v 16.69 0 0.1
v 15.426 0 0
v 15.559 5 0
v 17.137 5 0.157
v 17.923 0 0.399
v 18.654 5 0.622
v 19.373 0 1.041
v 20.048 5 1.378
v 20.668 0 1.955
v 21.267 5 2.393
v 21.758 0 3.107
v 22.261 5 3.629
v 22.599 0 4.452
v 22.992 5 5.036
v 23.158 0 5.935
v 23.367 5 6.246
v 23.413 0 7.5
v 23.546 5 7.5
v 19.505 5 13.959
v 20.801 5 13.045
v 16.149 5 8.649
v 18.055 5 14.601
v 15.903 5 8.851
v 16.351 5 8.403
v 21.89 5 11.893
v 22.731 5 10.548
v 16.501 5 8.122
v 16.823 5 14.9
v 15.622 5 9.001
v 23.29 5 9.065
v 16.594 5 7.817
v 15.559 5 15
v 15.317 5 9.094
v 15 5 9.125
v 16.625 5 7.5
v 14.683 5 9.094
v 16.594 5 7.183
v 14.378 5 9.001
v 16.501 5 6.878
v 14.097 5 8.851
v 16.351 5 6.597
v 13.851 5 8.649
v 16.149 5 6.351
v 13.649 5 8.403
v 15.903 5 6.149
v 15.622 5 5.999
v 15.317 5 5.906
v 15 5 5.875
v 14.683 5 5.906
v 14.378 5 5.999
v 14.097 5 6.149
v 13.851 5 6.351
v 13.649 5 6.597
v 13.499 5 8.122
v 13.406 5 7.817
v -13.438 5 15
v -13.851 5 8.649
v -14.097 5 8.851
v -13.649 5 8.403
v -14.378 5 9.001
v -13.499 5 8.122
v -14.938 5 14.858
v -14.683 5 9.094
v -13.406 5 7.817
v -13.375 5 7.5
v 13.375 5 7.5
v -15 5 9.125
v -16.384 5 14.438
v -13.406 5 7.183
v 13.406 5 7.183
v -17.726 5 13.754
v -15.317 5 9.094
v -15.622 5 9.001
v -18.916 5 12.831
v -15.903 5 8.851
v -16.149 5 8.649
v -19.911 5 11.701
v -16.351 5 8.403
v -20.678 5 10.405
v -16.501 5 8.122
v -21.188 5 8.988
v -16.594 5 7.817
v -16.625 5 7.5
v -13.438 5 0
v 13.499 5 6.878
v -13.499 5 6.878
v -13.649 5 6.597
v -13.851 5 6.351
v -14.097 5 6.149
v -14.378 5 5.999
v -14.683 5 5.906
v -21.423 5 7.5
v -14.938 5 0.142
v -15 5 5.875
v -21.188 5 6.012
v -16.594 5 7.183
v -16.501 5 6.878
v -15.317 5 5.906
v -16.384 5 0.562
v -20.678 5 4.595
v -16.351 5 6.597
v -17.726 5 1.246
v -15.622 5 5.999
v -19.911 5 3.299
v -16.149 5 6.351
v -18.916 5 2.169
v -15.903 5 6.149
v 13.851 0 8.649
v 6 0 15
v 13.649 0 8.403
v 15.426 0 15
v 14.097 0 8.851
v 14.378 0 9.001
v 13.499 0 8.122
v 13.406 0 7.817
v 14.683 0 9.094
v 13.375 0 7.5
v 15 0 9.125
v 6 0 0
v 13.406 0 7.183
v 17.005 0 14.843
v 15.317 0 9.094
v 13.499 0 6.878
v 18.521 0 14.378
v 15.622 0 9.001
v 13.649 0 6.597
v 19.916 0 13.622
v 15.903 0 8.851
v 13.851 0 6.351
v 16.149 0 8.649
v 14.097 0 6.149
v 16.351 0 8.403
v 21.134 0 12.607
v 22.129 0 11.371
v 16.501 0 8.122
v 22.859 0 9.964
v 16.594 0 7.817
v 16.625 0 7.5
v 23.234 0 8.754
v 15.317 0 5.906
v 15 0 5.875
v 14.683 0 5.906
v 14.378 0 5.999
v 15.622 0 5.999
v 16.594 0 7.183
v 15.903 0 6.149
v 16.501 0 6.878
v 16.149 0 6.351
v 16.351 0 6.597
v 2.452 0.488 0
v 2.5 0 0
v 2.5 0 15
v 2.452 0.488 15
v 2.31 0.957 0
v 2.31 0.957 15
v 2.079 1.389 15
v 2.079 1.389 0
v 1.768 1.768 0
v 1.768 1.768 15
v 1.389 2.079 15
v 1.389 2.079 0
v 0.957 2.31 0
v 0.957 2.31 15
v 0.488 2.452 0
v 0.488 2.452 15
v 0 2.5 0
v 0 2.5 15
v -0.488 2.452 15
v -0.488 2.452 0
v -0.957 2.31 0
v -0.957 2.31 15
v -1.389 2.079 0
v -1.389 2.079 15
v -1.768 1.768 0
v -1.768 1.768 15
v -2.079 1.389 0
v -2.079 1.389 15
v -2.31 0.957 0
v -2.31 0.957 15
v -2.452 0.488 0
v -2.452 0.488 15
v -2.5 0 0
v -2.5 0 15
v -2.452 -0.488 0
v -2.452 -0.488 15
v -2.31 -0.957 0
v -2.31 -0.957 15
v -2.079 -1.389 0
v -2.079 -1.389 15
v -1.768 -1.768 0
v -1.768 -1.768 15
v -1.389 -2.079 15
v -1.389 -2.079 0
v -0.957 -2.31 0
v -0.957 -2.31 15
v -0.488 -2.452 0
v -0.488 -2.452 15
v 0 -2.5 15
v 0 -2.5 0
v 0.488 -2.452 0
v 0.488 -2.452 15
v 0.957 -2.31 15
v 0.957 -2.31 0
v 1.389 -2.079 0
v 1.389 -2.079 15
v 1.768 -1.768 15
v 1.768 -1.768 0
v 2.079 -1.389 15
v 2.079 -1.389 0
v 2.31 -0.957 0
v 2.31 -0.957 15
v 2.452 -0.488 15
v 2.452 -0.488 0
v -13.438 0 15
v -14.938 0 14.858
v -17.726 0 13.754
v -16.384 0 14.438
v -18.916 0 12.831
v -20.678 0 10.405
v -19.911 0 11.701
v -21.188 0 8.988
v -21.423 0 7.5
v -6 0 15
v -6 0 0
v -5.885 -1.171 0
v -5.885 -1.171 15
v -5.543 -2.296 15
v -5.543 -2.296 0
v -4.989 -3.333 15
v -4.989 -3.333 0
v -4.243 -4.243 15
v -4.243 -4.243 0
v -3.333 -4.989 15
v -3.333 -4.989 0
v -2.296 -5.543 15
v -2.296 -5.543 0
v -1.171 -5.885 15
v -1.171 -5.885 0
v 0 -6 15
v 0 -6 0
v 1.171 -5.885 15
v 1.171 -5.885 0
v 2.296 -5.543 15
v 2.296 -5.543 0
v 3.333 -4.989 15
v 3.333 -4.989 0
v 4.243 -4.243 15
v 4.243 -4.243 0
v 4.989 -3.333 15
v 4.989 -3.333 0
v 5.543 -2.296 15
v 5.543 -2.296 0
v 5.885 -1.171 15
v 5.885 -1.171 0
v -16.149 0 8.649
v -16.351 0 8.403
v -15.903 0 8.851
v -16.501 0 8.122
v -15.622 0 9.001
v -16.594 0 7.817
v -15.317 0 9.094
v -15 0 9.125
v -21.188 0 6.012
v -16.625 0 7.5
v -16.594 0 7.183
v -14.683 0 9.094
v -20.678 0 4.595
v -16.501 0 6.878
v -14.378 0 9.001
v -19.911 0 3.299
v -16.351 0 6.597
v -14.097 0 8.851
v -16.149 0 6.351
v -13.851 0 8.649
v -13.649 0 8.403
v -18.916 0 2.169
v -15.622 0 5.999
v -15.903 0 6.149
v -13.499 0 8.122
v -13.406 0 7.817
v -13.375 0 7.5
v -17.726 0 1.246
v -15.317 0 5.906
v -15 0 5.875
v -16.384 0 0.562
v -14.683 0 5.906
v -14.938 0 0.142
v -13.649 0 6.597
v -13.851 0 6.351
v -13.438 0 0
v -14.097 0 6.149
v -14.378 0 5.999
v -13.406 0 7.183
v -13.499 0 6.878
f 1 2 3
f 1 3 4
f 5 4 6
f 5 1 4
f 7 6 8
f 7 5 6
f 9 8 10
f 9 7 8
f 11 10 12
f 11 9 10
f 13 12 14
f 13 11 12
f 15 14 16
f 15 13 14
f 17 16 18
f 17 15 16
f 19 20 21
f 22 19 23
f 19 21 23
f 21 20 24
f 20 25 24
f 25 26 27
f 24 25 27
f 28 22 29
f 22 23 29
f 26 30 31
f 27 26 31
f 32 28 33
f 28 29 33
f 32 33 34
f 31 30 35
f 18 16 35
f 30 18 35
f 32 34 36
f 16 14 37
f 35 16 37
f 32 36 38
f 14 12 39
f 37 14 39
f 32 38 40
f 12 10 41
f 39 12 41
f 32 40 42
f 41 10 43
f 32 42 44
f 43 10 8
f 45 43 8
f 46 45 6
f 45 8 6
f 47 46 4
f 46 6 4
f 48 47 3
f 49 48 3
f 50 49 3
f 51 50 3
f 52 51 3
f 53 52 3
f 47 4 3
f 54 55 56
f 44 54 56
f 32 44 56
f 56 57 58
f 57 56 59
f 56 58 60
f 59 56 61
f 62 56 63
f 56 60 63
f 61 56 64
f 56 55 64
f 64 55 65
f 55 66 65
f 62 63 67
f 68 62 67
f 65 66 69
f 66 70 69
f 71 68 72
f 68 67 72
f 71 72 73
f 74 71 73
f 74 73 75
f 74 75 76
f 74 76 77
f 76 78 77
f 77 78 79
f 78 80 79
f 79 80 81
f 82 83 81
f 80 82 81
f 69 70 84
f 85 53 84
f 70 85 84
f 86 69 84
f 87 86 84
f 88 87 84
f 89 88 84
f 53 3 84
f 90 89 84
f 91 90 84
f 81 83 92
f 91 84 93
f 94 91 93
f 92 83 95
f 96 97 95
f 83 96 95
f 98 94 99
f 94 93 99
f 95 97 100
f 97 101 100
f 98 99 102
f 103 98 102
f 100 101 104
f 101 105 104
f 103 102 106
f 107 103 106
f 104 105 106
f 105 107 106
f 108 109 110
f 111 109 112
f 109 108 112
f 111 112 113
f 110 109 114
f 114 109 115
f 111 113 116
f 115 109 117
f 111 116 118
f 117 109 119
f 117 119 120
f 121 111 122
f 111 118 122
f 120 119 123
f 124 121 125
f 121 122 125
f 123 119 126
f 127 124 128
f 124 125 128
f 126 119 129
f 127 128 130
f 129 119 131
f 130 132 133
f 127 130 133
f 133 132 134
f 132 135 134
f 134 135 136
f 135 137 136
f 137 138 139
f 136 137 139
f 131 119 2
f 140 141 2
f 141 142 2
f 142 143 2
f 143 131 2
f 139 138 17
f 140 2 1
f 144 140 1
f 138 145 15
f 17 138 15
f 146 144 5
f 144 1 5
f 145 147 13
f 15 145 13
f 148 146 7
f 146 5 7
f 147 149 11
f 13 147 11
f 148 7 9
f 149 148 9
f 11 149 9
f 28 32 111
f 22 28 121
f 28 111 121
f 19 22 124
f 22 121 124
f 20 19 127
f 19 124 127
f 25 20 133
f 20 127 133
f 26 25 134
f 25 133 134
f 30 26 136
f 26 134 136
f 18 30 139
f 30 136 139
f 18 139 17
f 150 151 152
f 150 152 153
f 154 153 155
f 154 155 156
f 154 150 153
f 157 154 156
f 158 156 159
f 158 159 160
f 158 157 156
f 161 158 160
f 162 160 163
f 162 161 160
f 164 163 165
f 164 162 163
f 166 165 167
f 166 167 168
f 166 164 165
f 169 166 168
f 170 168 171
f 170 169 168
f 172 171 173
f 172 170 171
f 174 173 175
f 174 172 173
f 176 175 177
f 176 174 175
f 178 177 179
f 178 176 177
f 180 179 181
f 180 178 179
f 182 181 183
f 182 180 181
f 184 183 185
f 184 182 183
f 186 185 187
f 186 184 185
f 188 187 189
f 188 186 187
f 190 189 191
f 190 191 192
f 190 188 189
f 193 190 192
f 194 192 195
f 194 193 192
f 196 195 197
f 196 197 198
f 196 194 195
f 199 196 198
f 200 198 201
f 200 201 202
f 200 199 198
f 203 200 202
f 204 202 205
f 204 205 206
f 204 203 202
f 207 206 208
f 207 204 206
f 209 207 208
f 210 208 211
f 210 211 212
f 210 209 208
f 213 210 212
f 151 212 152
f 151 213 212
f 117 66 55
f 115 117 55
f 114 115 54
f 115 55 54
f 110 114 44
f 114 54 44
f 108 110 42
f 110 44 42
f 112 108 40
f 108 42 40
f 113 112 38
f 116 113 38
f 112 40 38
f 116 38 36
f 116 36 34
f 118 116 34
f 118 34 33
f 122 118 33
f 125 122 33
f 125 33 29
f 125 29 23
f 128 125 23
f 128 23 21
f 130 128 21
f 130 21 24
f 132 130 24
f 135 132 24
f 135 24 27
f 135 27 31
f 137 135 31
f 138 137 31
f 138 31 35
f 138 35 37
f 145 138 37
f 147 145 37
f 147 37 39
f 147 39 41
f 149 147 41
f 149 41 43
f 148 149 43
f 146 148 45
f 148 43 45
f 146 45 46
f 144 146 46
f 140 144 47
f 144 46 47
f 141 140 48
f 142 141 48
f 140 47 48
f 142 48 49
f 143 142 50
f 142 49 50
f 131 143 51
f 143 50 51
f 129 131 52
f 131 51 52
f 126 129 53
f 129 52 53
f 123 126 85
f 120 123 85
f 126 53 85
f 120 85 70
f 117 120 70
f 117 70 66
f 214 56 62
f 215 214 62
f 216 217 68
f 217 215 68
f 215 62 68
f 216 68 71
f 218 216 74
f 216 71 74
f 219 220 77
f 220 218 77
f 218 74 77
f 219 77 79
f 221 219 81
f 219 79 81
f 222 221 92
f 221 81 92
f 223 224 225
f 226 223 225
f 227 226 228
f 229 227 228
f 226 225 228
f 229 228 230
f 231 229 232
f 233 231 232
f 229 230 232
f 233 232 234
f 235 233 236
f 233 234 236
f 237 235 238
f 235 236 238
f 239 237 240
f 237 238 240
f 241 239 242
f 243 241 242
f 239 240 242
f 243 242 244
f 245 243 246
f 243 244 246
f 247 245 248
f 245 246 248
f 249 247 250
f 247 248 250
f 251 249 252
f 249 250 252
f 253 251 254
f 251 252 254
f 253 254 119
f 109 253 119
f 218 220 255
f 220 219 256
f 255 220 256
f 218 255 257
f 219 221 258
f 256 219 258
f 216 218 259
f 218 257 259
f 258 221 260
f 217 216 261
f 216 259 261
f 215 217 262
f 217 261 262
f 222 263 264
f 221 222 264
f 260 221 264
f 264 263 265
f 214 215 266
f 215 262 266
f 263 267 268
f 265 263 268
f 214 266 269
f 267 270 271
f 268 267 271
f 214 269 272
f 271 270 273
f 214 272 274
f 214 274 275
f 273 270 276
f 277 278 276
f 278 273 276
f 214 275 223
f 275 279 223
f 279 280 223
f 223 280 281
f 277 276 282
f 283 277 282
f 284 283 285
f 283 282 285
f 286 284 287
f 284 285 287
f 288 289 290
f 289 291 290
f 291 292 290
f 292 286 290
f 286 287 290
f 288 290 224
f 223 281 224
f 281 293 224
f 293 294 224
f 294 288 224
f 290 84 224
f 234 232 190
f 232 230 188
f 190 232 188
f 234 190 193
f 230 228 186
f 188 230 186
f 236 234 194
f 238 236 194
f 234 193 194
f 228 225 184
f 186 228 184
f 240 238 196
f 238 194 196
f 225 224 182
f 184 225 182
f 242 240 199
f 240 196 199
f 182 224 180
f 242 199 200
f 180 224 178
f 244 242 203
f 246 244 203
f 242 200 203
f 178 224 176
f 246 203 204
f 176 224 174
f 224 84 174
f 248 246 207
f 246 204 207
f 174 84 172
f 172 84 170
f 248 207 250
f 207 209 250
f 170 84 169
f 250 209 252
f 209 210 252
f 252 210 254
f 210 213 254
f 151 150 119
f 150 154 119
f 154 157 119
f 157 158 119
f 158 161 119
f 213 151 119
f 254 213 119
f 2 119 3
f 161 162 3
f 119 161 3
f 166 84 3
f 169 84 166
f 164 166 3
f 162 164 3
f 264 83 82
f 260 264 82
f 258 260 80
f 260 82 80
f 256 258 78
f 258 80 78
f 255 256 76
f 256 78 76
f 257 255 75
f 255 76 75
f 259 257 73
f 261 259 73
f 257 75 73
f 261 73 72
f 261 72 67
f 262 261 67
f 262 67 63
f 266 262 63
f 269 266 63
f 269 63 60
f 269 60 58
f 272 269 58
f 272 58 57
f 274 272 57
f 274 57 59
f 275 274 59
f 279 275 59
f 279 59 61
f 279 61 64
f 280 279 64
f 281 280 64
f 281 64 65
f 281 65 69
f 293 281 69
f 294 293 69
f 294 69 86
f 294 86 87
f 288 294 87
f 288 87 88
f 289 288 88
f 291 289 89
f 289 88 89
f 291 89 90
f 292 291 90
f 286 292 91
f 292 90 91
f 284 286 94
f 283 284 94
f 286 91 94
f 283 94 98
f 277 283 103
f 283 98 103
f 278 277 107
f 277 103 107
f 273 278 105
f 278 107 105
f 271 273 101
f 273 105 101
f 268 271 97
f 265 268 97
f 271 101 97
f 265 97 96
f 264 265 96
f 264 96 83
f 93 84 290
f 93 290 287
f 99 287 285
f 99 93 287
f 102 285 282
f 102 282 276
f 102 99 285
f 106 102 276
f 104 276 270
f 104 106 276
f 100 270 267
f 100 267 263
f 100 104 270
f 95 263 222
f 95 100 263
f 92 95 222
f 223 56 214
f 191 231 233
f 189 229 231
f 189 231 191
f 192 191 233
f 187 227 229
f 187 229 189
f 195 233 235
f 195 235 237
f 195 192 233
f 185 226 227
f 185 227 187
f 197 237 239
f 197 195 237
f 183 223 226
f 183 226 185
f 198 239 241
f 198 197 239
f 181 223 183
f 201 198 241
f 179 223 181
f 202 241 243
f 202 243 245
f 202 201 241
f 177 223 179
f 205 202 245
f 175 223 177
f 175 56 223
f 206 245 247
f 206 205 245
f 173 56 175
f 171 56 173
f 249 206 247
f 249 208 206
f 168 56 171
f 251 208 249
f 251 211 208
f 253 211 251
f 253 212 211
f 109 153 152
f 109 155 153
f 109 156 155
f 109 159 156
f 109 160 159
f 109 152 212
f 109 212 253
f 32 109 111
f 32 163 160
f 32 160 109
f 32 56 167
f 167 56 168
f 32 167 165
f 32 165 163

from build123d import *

# Parameters (mm, degrees)
F0_R        = 2.5
F1_DEPTH    = 15
F3_D        = 3.25
F4_T1_DEPTH = 45
F4_T3_DEPTH = 45.0017535366


# Not quite as in the source:
# - a fillet or chamfer that OpenCascade refuses, or shapes differently, is made with other operations: its cross-section is extruded or revolved along the edge and cut away or added


with BuildPart() as f1:
    # F0 (on Top) → F1 (new body)
    with BuildSketch(Plane.XY):
        with BuildLine():
            Line((6, 0), (23.4290786547, 0))
            Line((23.4290786547, 0), (23.5615114343, 5))
            Line((23.5615114343, 5), (-21.4384885657, 5))
            Line((-21.4384885657, 5), (-21.4384885657, 0))
            Line((-21.4384885657, 0), (-6, 0))
            ThreePointArc((-6, 0), (0, -6), (6, 0))
        make_face()
        Circle(F0_R, mode=Mode.SUBTRACT)
    extrude(amount=F1_DEPTH)

    # F3 (through all)
    with Locations(Plane.XZ):
        with Locations((-15, 7.5), (15, 7.5)):
            Hole(F3_D / 2)

    # F4: fillet of radius 8 on 4 edges, made by hand

    # F4_s2 → F4_t1 (cut)
    with BuildSketch(Plane.XZ.offset(-25)):
        with BuildLine():
            ThreePointArc((-13.4384885657, 15), (-19.0953428152, 12.6568542495), (-21.4384885657, 7))
            Line((-21.4384885657, 7), (-21.4384885657, 15))
            Line((-21.4384885657, 15), (-13.4384885657, 15))
        make_face()
        with BuildLine():
            ThreePointArc((-13.4384885657, 0), (-19.0953428152, 2.3431457505), (-21.4384885657, 8))
            Line((-21.4384885657, 8), (-21.4384885657, 0))
            Line((-21.4384885657, 0), (-13.4384885657, 0))
        make_face()
    extrude(amount=F4_T1_DEPTH, mode=Mode.SUBTRACT)

    # F4_s4 → F4_t3 (cut)
    with BuildSketch(Plane(origin=(-0.5131205452, -19.3728677482, 0), x_dir=(0, 0, 1), z_dir=(0.0264772702, 0.9996494156, 0))):
        with BuildLine():
            ThreePointArc((15, 15.4208647858), (12.6568542495, 21.0777190353), (7, 23.4208647858))
            Line((7, 23.4208647858), (15, 23.4208647858))
            Line((15, 23.4208647858), (15, 15.4208647858))
        make_face()
        with BuildLine():
            ThreePointArc((0, 15.4208647858), (2.3431457505, 21.0777190353), (8, 23.4208647858))
            Line((8, 23.4208647858), (0, 23.4208647858))
            Line((0, 23.4208647858), (0, 15.4208647858))
        make_face()
    extrude(amount=F4_T3_DEPTH, mode=Mode.SUBTRACT)


solid = f1.part
